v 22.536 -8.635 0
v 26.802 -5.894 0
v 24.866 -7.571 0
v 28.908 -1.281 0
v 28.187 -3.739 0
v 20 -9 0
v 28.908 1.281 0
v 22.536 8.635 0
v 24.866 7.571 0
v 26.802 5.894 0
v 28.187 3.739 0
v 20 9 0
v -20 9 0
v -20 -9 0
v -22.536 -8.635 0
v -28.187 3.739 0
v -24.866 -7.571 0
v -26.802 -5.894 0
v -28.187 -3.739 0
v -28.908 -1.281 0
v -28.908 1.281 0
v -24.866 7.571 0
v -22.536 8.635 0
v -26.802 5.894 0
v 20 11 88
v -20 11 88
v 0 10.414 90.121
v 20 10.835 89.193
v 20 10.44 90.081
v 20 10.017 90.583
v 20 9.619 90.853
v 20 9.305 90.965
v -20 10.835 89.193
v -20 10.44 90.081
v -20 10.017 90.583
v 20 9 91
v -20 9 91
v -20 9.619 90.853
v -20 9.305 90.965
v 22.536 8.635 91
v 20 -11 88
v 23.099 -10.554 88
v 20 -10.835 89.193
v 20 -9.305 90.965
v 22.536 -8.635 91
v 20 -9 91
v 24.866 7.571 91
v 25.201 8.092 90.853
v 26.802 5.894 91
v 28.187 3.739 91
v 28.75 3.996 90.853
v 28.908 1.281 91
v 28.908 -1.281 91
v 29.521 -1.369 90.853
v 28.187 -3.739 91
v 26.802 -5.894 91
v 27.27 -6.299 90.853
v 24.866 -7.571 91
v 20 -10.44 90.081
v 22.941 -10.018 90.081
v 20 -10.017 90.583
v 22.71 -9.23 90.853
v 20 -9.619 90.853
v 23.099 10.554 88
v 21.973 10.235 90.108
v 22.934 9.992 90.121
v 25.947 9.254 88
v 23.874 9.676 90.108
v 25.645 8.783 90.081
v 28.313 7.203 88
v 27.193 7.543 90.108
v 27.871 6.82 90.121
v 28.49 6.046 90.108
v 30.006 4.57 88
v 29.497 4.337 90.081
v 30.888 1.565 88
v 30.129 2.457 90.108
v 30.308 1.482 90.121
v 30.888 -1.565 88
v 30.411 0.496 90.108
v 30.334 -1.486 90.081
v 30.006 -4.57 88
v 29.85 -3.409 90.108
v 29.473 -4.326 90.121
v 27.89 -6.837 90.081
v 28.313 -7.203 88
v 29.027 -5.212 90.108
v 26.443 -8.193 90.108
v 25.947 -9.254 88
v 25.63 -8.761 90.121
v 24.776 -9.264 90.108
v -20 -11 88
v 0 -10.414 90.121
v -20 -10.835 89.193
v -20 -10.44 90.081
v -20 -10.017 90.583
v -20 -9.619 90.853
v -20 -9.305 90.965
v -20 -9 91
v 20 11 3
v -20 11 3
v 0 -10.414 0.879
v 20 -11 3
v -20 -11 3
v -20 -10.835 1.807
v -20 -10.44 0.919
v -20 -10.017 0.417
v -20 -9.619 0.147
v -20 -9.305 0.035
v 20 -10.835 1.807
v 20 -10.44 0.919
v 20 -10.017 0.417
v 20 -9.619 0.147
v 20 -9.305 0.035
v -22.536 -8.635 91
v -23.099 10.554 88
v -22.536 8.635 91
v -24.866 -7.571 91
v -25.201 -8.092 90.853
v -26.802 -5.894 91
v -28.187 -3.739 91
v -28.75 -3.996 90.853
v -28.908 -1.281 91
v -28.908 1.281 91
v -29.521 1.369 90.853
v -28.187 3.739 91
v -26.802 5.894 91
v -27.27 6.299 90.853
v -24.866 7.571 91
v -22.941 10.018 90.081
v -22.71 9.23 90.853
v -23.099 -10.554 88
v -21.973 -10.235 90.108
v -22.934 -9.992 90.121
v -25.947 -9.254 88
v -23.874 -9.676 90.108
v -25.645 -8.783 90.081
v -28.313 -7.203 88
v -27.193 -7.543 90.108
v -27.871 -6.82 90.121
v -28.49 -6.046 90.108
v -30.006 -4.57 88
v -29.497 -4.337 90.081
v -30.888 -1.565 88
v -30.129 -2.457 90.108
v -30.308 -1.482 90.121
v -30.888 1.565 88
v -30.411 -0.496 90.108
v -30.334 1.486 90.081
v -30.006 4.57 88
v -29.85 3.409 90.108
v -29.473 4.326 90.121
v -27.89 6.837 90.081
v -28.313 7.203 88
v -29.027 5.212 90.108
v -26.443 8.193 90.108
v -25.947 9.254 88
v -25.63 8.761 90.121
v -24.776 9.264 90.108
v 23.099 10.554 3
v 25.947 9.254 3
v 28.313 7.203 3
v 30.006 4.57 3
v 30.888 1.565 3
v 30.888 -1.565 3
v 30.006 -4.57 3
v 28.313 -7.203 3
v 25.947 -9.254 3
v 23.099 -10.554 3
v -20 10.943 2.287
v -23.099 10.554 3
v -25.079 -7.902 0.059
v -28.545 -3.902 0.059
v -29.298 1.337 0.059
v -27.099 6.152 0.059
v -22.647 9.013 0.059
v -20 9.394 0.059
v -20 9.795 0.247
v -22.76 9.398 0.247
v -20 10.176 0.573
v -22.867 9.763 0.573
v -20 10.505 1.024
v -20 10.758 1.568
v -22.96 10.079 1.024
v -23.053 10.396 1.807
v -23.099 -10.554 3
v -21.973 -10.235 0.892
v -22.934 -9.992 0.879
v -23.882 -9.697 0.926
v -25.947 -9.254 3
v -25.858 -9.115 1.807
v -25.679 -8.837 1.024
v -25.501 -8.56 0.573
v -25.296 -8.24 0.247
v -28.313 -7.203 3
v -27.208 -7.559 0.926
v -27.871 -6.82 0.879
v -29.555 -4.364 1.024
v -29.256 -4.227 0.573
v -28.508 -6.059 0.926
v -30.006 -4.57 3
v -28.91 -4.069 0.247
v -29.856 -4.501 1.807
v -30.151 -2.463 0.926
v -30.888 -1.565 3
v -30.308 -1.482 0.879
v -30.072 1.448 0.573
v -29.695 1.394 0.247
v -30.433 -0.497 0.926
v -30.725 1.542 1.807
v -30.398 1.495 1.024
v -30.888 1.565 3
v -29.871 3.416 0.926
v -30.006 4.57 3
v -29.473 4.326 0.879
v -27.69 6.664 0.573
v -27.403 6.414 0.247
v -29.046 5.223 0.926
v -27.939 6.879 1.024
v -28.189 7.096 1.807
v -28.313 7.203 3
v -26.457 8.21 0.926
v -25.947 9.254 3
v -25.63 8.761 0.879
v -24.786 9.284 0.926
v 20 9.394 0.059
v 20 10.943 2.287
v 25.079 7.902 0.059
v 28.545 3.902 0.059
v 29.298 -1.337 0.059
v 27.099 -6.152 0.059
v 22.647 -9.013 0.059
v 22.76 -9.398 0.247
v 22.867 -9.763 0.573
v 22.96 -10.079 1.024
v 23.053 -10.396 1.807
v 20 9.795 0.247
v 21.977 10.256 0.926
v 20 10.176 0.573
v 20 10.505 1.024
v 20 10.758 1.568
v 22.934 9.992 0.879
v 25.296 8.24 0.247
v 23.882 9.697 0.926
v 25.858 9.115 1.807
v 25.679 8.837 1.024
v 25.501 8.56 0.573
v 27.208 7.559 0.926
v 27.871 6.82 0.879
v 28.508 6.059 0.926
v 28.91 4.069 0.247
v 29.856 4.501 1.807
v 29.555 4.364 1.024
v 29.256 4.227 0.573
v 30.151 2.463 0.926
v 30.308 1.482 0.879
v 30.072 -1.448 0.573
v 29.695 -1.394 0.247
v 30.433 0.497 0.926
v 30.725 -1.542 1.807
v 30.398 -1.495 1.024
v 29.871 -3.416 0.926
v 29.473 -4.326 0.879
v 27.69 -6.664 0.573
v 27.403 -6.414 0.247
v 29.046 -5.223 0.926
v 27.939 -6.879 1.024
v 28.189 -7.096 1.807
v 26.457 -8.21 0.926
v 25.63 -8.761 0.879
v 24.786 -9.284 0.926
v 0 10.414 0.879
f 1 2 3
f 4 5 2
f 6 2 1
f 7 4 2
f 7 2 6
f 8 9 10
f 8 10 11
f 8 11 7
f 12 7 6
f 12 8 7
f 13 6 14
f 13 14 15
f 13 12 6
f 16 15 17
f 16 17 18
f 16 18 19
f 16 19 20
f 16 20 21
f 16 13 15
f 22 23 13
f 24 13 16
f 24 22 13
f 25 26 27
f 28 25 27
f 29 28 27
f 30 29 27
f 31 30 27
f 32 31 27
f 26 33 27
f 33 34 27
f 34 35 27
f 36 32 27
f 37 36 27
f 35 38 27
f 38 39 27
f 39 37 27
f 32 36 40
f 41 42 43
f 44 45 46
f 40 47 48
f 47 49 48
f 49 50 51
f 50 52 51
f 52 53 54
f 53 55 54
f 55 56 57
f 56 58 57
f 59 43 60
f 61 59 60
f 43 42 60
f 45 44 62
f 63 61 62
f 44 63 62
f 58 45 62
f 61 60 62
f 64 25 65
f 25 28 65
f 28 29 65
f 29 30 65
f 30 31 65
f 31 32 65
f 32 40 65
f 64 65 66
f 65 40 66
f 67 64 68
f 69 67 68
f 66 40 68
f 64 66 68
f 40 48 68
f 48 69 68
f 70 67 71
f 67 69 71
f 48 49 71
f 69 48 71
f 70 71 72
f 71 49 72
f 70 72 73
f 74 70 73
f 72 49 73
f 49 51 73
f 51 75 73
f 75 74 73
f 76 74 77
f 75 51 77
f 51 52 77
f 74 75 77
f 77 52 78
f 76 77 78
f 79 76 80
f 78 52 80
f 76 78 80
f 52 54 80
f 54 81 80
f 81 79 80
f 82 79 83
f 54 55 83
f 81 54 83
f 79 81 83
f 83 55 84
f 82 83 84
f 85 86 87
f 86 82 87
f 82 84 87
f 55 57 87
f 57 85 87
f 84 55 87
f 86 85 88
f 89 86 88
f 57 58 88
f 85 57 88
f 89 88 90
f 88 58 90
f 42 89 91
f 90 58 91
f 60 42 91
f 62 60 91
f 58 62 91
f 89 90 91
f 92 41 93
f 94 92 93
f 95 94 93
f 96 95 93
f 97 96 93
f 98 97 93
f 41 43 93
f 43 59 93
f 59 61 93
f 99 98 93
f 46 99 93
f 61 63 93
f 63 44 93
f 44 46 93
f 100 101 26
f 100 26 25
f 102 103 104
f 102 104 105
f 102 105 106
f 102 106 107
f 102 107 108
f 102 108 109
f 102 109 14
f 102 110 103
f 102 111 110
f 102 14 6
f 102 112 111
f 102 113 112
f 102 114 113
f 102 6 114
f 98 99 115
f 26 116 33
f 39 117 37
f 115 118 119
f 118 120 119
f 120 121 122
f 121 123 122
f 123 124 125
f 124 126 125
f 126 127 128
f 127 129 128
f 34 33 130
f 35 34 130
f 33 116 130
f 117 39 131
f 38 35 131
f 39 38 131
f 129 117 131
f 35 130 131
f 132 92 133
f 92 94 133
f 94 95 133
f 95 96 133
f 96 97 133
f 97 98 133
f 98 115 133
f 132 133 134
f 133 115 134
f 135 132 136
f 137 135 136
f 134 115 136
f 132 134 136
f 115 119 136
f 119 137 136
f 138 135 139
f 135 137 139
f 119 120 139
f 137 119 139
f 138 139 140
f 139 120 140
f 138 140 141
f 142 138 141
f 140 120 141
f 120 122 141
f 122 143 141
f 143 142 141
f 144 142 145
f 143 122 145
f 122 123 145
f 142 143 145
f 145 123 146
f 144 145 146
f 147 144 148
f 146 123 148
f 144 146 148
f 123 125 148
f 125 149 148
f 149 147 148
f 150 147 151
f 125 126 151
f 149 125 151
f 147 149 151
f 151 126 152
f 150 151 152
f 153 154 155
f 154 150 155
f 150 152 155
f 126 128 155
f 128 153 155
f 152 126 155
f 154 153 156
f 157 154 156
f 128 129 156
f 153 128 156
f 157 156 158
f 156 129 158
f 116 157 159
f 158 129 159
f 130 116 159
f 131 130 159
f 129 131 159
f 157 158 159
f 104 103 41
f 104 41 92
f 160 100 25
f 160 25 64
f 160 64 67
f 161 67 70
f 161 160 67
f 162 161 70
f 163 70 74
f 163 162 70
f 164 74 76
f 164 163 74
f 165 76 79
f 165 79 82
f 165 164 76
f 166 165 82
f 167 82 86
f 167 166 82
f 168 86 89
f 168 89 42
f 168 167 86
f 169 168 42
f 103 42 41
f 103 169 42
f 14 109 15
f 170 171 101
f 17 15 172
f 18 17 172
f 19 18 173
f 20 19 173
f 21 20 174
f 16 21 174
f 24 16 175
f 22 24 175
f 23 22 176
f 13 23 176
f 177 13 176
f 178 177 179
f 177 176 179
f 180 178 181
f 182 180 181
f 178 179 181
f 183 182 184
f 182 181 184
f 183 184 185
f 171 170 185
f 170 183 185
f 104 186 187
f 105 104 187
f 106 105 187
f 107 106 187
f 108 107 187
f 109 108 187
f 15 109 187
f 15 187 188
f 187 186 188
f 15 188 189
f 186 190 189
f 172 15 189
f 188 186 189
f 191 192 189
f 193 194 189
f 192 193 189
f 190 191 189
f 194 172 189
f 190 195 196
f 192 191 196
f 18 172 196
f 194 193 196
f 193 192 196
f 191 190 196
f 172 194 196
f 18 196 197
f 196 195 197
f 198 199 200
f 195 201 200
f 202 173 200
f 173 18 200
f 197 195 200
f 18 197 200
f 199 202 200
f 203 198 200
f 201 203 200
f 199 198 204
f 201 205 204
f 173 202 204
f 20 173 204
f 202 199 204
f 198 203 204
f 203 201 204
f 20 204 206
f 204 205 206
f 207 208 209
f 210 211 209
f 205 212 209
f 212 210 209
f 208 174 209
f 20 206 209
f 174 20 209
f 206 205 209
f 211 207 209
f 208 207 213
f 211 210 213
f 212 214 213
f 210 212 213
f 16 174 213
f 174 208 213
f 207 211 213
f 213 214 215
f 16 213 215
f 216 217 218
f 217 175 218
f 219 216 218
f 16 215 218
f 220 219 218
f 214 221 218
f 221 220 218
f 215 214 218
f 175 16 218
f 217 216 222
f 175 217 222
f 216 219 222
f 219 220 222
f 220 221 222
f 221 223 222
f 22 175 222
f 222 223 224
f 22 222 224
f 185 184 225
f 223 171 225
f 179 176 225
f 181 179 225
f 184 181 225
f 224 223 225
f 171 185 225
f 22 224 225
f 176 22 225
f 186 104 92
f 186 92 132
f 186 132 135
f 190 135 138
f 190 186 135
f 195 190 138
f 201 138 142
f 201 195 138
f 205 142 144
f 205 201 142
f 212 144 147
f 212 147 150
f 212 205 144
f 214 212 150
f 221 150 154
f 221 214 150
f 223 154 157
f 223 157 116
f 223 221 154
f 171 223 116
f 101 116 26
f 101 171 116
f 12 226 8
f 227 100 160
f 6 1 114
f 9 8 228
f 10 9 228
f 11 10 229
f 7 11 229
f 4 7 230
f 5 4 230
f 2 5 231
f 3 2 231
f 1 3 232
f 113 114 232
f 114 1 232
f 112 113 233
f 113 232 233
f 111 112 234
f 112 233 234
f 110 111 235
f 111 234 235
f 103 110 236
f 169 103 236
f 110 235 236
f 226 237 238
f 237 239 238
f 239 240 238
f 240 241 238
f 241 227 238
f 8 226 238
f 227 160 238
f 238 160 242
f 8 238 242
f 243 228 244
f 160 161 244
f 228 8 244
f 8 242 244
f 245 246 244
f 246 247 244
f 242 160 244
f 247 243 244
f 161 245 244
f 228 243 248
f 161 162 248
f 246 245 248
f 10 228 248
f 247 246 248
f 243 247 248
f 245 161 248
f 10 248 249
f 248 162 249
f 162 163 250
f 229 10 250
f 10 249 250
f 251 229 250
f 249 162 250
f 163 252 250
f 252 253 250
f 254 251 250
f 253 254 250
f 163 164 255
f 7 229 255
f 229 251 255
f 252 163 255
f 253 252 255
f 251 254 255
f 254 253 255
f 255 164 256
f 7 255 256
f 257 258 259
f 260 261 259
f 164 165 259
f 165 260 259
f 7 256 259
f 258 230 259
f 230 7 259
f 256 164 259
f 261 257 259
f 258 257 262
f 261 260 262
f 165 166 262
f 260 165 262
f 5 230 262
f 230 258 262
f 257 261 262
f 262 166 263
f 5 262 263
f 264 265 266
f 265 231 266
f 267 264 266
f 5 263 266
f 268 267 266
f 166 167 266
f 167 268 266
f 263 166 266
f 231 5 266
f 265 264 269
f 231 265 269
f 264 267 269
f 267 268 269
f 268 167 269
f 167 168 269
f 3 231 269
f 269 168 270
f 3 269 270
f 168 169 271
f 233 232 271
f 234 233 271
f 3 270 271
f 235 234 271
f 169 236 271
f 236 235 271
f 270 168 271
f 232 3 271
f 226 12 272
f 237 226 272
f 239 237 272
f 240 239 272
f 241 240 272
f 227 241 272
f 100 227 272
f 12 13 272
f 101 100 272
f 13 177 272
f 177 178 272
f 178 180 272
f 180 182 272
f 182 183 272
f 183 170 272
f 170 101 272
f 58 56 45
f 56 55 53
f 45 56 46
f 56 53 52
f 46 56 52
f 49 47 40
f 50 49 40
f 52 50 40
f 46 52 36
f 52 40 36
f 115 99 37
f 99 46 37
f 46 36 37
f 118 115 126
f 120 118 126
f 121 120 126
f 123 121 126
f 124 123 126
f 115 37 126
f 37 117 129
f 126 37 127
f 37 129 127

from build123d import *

# Parameters (mm, degrees)
EXTRUDE_1_DEPTH = 91
FILLET_1_SIZE   = 3
FILLET_1_SIZE_2 = 2
FILLET_2_SIZE   = 3
FILLET_2_SIZE_2 = 2


with BuildPart() as part:
    # ｽｹｯﾁ1 → ﾎﾞｽ - 押し出し1 (new body)
    with BuildSketch(Plane.XY):
        with BuildLine():
            Line((20, -11), (-20, -11))
            ThreePointArc((-20, -11), (-31, 0), (-20, 11))
            Line((-20, 11), (20, 11))
            ThreePointArc((20, 11), (31, 0), (20, -11))
        make_face()
    extrude(amount=EXTRUDE_1_DEPTH)

    # ﾌｨﾚｯﾄ1
    # an asymmetric fillet: 3, 2 mm, written as the material it takes off along each edge
    with BuildSketch(Plane(origin=(20, -11, 91), x_dir=(0, 0, -1), z_dir=(-1, 0, 0)), Plane(origin=(-20, 11, 91), x_dir=(0, 0, -1), z_dir=(1, 0, 0))) as fillet_1_piece_1:
        with BuildLine():
            Bezier((FILLET_1_SIZE, 0), (0, 0), (0, -FILLET_1_SIZE_2), weights=[1, 0.707106781, 1])
            Line((0, -FILLET_1_SIZE_2), (0, 0))
            Line((0, 0), (FILLET_1_SIZE, 0))
        make_face()
    extrude(amount=40, mode=Mode.SUBTRACT)
    with BuildSketch(Plane(origin=(20, 0, 91), x_dir=(0, 1, 0), z_dir=(-1, 0, 0))) as fillet_1_piece_2:
        with BuildLine():
            Bezier((11, FILLET_1_SIZE), (11, 0), (11 - FILLET_1_SIZE_2, 0), weights=[1, 0.707106781, 1])
            Line((11 - FILLET_1_SIZE_2, 0), (11, 0))
            Line((11, 0), (11, FILLET_1_SIZE))
        make_face()
    revolve(axis=Axis((20, 0, 91), (0, 0, -1)), revolution_arc=180, mode=Mode.SUBTRACT)
    with BuildSketch(Plane(origin=(-20, 0, 91), x_dir=(0, -1, 0), z_dir=(1, 0, 0))) as fillet_1_piece_3:
        with BuildLine():
            Bezier((11, FILLET_1_SIZE), (11, 0), (11 - FILLET_1_SIZE_2, 0), weights=[1, 0.707106781, 1])
            Line((11 - FILLET_1_SIZE_2, 0), (11, 0))
            Line((11, 0), (11, FILLET_1_SIZE))
        make_face()
    revolve(axis=Axis((-20, 0, 91), (0, 0, -1)), revolution_arc=180, mode=Mode.SUBTRACT)

    # ﾌｨﾚｯﾄ2
    # an asymmetric fillet: 3, 2 mm, written as the material it takes off along each edge
    with BuildSketch(Plane(origin=(20, -11, 0), x_dir=(0, 0, 1), z_dir=(-1, 0, 0))) as fillet_2_piece_1:
        with BuildLine():
            Bezier((FILLET_2_SIZE, 0), (0, 0), (0, FILLET_2_SIZE_2), weights=[1, 0.707106781, 1])
            Line((0, FILLET_2_SIZE_2), (0, 0))
            Line((0, 0), (FILLET_2_SIZE, 0))
        make_face()
    extrude(amount=40, mode=Mode.SUBTRACT)
    with BuildSketch(Plane(origin=(-20, 0, 0), x_dir=(0, -1, 0), z_dir=(1, 0, 0))) as fillet_2_piece_2:
        with BuildLine():
            Bezier((11 - FILLET_2_SIZE_2, 0), (11, 0), (11, -FILLET_2_SIZE), weights=[1, 0.707106781, 1])
            Line((11, -FILLET_2_SIZE), (11, 0))
            Line((11, 0), (11 - FILLET_2_SIZE_2, 0))
        make_face()
    revolve(axis=Axis((-20, 0, 0), (0, 0, -1)), revolution_arc=180, mode=Mode.SUBTRACT)
    with BuildSketch(Plane(origin=(-20, 11, 0), x_dir=(0, -1, 0), z_dir=(1, 0, 0))) as fillet_2_piece_3:
        with BuildLine():
            Bezier((FILLET_2_SIZE_2, 0), (0, 0), (0, -FILLET_2_SIZE), weights=[1, 0.707106781, 1])
            Line((0, -FILLET_2_SIZE), (0, 0))
            Line((0, 0), (FILLET_2_SIZE_2, 0))
        make_face()
    extrude(amount=40, mode=Mode.SUBTRACT)
    with BuildSketch(Plane(origin=(20, 0, 0), x_dir=(0, 1, 0), z_dir=(-1, 0, 0))) as fillet_2_piece_4:
        with BuildLine():
            Bezier((11 - FILLET_2_SIZE_2, 0), (11, 0), (11, -FILLET_2_SIZE), weights=[1, 0.707106781, 1])
            Line((11, -FILLET_2_SIZE), (11, 0))
            Line((11, 0), (11 - FILLET_2_SIZE_2, 0))
        make_face()
    revolve(axis=Axis((20, 0, 0), (0, 0, -1)), revolution_arc=180, mode=Mode.SUBTRACT)


solid = part.part
